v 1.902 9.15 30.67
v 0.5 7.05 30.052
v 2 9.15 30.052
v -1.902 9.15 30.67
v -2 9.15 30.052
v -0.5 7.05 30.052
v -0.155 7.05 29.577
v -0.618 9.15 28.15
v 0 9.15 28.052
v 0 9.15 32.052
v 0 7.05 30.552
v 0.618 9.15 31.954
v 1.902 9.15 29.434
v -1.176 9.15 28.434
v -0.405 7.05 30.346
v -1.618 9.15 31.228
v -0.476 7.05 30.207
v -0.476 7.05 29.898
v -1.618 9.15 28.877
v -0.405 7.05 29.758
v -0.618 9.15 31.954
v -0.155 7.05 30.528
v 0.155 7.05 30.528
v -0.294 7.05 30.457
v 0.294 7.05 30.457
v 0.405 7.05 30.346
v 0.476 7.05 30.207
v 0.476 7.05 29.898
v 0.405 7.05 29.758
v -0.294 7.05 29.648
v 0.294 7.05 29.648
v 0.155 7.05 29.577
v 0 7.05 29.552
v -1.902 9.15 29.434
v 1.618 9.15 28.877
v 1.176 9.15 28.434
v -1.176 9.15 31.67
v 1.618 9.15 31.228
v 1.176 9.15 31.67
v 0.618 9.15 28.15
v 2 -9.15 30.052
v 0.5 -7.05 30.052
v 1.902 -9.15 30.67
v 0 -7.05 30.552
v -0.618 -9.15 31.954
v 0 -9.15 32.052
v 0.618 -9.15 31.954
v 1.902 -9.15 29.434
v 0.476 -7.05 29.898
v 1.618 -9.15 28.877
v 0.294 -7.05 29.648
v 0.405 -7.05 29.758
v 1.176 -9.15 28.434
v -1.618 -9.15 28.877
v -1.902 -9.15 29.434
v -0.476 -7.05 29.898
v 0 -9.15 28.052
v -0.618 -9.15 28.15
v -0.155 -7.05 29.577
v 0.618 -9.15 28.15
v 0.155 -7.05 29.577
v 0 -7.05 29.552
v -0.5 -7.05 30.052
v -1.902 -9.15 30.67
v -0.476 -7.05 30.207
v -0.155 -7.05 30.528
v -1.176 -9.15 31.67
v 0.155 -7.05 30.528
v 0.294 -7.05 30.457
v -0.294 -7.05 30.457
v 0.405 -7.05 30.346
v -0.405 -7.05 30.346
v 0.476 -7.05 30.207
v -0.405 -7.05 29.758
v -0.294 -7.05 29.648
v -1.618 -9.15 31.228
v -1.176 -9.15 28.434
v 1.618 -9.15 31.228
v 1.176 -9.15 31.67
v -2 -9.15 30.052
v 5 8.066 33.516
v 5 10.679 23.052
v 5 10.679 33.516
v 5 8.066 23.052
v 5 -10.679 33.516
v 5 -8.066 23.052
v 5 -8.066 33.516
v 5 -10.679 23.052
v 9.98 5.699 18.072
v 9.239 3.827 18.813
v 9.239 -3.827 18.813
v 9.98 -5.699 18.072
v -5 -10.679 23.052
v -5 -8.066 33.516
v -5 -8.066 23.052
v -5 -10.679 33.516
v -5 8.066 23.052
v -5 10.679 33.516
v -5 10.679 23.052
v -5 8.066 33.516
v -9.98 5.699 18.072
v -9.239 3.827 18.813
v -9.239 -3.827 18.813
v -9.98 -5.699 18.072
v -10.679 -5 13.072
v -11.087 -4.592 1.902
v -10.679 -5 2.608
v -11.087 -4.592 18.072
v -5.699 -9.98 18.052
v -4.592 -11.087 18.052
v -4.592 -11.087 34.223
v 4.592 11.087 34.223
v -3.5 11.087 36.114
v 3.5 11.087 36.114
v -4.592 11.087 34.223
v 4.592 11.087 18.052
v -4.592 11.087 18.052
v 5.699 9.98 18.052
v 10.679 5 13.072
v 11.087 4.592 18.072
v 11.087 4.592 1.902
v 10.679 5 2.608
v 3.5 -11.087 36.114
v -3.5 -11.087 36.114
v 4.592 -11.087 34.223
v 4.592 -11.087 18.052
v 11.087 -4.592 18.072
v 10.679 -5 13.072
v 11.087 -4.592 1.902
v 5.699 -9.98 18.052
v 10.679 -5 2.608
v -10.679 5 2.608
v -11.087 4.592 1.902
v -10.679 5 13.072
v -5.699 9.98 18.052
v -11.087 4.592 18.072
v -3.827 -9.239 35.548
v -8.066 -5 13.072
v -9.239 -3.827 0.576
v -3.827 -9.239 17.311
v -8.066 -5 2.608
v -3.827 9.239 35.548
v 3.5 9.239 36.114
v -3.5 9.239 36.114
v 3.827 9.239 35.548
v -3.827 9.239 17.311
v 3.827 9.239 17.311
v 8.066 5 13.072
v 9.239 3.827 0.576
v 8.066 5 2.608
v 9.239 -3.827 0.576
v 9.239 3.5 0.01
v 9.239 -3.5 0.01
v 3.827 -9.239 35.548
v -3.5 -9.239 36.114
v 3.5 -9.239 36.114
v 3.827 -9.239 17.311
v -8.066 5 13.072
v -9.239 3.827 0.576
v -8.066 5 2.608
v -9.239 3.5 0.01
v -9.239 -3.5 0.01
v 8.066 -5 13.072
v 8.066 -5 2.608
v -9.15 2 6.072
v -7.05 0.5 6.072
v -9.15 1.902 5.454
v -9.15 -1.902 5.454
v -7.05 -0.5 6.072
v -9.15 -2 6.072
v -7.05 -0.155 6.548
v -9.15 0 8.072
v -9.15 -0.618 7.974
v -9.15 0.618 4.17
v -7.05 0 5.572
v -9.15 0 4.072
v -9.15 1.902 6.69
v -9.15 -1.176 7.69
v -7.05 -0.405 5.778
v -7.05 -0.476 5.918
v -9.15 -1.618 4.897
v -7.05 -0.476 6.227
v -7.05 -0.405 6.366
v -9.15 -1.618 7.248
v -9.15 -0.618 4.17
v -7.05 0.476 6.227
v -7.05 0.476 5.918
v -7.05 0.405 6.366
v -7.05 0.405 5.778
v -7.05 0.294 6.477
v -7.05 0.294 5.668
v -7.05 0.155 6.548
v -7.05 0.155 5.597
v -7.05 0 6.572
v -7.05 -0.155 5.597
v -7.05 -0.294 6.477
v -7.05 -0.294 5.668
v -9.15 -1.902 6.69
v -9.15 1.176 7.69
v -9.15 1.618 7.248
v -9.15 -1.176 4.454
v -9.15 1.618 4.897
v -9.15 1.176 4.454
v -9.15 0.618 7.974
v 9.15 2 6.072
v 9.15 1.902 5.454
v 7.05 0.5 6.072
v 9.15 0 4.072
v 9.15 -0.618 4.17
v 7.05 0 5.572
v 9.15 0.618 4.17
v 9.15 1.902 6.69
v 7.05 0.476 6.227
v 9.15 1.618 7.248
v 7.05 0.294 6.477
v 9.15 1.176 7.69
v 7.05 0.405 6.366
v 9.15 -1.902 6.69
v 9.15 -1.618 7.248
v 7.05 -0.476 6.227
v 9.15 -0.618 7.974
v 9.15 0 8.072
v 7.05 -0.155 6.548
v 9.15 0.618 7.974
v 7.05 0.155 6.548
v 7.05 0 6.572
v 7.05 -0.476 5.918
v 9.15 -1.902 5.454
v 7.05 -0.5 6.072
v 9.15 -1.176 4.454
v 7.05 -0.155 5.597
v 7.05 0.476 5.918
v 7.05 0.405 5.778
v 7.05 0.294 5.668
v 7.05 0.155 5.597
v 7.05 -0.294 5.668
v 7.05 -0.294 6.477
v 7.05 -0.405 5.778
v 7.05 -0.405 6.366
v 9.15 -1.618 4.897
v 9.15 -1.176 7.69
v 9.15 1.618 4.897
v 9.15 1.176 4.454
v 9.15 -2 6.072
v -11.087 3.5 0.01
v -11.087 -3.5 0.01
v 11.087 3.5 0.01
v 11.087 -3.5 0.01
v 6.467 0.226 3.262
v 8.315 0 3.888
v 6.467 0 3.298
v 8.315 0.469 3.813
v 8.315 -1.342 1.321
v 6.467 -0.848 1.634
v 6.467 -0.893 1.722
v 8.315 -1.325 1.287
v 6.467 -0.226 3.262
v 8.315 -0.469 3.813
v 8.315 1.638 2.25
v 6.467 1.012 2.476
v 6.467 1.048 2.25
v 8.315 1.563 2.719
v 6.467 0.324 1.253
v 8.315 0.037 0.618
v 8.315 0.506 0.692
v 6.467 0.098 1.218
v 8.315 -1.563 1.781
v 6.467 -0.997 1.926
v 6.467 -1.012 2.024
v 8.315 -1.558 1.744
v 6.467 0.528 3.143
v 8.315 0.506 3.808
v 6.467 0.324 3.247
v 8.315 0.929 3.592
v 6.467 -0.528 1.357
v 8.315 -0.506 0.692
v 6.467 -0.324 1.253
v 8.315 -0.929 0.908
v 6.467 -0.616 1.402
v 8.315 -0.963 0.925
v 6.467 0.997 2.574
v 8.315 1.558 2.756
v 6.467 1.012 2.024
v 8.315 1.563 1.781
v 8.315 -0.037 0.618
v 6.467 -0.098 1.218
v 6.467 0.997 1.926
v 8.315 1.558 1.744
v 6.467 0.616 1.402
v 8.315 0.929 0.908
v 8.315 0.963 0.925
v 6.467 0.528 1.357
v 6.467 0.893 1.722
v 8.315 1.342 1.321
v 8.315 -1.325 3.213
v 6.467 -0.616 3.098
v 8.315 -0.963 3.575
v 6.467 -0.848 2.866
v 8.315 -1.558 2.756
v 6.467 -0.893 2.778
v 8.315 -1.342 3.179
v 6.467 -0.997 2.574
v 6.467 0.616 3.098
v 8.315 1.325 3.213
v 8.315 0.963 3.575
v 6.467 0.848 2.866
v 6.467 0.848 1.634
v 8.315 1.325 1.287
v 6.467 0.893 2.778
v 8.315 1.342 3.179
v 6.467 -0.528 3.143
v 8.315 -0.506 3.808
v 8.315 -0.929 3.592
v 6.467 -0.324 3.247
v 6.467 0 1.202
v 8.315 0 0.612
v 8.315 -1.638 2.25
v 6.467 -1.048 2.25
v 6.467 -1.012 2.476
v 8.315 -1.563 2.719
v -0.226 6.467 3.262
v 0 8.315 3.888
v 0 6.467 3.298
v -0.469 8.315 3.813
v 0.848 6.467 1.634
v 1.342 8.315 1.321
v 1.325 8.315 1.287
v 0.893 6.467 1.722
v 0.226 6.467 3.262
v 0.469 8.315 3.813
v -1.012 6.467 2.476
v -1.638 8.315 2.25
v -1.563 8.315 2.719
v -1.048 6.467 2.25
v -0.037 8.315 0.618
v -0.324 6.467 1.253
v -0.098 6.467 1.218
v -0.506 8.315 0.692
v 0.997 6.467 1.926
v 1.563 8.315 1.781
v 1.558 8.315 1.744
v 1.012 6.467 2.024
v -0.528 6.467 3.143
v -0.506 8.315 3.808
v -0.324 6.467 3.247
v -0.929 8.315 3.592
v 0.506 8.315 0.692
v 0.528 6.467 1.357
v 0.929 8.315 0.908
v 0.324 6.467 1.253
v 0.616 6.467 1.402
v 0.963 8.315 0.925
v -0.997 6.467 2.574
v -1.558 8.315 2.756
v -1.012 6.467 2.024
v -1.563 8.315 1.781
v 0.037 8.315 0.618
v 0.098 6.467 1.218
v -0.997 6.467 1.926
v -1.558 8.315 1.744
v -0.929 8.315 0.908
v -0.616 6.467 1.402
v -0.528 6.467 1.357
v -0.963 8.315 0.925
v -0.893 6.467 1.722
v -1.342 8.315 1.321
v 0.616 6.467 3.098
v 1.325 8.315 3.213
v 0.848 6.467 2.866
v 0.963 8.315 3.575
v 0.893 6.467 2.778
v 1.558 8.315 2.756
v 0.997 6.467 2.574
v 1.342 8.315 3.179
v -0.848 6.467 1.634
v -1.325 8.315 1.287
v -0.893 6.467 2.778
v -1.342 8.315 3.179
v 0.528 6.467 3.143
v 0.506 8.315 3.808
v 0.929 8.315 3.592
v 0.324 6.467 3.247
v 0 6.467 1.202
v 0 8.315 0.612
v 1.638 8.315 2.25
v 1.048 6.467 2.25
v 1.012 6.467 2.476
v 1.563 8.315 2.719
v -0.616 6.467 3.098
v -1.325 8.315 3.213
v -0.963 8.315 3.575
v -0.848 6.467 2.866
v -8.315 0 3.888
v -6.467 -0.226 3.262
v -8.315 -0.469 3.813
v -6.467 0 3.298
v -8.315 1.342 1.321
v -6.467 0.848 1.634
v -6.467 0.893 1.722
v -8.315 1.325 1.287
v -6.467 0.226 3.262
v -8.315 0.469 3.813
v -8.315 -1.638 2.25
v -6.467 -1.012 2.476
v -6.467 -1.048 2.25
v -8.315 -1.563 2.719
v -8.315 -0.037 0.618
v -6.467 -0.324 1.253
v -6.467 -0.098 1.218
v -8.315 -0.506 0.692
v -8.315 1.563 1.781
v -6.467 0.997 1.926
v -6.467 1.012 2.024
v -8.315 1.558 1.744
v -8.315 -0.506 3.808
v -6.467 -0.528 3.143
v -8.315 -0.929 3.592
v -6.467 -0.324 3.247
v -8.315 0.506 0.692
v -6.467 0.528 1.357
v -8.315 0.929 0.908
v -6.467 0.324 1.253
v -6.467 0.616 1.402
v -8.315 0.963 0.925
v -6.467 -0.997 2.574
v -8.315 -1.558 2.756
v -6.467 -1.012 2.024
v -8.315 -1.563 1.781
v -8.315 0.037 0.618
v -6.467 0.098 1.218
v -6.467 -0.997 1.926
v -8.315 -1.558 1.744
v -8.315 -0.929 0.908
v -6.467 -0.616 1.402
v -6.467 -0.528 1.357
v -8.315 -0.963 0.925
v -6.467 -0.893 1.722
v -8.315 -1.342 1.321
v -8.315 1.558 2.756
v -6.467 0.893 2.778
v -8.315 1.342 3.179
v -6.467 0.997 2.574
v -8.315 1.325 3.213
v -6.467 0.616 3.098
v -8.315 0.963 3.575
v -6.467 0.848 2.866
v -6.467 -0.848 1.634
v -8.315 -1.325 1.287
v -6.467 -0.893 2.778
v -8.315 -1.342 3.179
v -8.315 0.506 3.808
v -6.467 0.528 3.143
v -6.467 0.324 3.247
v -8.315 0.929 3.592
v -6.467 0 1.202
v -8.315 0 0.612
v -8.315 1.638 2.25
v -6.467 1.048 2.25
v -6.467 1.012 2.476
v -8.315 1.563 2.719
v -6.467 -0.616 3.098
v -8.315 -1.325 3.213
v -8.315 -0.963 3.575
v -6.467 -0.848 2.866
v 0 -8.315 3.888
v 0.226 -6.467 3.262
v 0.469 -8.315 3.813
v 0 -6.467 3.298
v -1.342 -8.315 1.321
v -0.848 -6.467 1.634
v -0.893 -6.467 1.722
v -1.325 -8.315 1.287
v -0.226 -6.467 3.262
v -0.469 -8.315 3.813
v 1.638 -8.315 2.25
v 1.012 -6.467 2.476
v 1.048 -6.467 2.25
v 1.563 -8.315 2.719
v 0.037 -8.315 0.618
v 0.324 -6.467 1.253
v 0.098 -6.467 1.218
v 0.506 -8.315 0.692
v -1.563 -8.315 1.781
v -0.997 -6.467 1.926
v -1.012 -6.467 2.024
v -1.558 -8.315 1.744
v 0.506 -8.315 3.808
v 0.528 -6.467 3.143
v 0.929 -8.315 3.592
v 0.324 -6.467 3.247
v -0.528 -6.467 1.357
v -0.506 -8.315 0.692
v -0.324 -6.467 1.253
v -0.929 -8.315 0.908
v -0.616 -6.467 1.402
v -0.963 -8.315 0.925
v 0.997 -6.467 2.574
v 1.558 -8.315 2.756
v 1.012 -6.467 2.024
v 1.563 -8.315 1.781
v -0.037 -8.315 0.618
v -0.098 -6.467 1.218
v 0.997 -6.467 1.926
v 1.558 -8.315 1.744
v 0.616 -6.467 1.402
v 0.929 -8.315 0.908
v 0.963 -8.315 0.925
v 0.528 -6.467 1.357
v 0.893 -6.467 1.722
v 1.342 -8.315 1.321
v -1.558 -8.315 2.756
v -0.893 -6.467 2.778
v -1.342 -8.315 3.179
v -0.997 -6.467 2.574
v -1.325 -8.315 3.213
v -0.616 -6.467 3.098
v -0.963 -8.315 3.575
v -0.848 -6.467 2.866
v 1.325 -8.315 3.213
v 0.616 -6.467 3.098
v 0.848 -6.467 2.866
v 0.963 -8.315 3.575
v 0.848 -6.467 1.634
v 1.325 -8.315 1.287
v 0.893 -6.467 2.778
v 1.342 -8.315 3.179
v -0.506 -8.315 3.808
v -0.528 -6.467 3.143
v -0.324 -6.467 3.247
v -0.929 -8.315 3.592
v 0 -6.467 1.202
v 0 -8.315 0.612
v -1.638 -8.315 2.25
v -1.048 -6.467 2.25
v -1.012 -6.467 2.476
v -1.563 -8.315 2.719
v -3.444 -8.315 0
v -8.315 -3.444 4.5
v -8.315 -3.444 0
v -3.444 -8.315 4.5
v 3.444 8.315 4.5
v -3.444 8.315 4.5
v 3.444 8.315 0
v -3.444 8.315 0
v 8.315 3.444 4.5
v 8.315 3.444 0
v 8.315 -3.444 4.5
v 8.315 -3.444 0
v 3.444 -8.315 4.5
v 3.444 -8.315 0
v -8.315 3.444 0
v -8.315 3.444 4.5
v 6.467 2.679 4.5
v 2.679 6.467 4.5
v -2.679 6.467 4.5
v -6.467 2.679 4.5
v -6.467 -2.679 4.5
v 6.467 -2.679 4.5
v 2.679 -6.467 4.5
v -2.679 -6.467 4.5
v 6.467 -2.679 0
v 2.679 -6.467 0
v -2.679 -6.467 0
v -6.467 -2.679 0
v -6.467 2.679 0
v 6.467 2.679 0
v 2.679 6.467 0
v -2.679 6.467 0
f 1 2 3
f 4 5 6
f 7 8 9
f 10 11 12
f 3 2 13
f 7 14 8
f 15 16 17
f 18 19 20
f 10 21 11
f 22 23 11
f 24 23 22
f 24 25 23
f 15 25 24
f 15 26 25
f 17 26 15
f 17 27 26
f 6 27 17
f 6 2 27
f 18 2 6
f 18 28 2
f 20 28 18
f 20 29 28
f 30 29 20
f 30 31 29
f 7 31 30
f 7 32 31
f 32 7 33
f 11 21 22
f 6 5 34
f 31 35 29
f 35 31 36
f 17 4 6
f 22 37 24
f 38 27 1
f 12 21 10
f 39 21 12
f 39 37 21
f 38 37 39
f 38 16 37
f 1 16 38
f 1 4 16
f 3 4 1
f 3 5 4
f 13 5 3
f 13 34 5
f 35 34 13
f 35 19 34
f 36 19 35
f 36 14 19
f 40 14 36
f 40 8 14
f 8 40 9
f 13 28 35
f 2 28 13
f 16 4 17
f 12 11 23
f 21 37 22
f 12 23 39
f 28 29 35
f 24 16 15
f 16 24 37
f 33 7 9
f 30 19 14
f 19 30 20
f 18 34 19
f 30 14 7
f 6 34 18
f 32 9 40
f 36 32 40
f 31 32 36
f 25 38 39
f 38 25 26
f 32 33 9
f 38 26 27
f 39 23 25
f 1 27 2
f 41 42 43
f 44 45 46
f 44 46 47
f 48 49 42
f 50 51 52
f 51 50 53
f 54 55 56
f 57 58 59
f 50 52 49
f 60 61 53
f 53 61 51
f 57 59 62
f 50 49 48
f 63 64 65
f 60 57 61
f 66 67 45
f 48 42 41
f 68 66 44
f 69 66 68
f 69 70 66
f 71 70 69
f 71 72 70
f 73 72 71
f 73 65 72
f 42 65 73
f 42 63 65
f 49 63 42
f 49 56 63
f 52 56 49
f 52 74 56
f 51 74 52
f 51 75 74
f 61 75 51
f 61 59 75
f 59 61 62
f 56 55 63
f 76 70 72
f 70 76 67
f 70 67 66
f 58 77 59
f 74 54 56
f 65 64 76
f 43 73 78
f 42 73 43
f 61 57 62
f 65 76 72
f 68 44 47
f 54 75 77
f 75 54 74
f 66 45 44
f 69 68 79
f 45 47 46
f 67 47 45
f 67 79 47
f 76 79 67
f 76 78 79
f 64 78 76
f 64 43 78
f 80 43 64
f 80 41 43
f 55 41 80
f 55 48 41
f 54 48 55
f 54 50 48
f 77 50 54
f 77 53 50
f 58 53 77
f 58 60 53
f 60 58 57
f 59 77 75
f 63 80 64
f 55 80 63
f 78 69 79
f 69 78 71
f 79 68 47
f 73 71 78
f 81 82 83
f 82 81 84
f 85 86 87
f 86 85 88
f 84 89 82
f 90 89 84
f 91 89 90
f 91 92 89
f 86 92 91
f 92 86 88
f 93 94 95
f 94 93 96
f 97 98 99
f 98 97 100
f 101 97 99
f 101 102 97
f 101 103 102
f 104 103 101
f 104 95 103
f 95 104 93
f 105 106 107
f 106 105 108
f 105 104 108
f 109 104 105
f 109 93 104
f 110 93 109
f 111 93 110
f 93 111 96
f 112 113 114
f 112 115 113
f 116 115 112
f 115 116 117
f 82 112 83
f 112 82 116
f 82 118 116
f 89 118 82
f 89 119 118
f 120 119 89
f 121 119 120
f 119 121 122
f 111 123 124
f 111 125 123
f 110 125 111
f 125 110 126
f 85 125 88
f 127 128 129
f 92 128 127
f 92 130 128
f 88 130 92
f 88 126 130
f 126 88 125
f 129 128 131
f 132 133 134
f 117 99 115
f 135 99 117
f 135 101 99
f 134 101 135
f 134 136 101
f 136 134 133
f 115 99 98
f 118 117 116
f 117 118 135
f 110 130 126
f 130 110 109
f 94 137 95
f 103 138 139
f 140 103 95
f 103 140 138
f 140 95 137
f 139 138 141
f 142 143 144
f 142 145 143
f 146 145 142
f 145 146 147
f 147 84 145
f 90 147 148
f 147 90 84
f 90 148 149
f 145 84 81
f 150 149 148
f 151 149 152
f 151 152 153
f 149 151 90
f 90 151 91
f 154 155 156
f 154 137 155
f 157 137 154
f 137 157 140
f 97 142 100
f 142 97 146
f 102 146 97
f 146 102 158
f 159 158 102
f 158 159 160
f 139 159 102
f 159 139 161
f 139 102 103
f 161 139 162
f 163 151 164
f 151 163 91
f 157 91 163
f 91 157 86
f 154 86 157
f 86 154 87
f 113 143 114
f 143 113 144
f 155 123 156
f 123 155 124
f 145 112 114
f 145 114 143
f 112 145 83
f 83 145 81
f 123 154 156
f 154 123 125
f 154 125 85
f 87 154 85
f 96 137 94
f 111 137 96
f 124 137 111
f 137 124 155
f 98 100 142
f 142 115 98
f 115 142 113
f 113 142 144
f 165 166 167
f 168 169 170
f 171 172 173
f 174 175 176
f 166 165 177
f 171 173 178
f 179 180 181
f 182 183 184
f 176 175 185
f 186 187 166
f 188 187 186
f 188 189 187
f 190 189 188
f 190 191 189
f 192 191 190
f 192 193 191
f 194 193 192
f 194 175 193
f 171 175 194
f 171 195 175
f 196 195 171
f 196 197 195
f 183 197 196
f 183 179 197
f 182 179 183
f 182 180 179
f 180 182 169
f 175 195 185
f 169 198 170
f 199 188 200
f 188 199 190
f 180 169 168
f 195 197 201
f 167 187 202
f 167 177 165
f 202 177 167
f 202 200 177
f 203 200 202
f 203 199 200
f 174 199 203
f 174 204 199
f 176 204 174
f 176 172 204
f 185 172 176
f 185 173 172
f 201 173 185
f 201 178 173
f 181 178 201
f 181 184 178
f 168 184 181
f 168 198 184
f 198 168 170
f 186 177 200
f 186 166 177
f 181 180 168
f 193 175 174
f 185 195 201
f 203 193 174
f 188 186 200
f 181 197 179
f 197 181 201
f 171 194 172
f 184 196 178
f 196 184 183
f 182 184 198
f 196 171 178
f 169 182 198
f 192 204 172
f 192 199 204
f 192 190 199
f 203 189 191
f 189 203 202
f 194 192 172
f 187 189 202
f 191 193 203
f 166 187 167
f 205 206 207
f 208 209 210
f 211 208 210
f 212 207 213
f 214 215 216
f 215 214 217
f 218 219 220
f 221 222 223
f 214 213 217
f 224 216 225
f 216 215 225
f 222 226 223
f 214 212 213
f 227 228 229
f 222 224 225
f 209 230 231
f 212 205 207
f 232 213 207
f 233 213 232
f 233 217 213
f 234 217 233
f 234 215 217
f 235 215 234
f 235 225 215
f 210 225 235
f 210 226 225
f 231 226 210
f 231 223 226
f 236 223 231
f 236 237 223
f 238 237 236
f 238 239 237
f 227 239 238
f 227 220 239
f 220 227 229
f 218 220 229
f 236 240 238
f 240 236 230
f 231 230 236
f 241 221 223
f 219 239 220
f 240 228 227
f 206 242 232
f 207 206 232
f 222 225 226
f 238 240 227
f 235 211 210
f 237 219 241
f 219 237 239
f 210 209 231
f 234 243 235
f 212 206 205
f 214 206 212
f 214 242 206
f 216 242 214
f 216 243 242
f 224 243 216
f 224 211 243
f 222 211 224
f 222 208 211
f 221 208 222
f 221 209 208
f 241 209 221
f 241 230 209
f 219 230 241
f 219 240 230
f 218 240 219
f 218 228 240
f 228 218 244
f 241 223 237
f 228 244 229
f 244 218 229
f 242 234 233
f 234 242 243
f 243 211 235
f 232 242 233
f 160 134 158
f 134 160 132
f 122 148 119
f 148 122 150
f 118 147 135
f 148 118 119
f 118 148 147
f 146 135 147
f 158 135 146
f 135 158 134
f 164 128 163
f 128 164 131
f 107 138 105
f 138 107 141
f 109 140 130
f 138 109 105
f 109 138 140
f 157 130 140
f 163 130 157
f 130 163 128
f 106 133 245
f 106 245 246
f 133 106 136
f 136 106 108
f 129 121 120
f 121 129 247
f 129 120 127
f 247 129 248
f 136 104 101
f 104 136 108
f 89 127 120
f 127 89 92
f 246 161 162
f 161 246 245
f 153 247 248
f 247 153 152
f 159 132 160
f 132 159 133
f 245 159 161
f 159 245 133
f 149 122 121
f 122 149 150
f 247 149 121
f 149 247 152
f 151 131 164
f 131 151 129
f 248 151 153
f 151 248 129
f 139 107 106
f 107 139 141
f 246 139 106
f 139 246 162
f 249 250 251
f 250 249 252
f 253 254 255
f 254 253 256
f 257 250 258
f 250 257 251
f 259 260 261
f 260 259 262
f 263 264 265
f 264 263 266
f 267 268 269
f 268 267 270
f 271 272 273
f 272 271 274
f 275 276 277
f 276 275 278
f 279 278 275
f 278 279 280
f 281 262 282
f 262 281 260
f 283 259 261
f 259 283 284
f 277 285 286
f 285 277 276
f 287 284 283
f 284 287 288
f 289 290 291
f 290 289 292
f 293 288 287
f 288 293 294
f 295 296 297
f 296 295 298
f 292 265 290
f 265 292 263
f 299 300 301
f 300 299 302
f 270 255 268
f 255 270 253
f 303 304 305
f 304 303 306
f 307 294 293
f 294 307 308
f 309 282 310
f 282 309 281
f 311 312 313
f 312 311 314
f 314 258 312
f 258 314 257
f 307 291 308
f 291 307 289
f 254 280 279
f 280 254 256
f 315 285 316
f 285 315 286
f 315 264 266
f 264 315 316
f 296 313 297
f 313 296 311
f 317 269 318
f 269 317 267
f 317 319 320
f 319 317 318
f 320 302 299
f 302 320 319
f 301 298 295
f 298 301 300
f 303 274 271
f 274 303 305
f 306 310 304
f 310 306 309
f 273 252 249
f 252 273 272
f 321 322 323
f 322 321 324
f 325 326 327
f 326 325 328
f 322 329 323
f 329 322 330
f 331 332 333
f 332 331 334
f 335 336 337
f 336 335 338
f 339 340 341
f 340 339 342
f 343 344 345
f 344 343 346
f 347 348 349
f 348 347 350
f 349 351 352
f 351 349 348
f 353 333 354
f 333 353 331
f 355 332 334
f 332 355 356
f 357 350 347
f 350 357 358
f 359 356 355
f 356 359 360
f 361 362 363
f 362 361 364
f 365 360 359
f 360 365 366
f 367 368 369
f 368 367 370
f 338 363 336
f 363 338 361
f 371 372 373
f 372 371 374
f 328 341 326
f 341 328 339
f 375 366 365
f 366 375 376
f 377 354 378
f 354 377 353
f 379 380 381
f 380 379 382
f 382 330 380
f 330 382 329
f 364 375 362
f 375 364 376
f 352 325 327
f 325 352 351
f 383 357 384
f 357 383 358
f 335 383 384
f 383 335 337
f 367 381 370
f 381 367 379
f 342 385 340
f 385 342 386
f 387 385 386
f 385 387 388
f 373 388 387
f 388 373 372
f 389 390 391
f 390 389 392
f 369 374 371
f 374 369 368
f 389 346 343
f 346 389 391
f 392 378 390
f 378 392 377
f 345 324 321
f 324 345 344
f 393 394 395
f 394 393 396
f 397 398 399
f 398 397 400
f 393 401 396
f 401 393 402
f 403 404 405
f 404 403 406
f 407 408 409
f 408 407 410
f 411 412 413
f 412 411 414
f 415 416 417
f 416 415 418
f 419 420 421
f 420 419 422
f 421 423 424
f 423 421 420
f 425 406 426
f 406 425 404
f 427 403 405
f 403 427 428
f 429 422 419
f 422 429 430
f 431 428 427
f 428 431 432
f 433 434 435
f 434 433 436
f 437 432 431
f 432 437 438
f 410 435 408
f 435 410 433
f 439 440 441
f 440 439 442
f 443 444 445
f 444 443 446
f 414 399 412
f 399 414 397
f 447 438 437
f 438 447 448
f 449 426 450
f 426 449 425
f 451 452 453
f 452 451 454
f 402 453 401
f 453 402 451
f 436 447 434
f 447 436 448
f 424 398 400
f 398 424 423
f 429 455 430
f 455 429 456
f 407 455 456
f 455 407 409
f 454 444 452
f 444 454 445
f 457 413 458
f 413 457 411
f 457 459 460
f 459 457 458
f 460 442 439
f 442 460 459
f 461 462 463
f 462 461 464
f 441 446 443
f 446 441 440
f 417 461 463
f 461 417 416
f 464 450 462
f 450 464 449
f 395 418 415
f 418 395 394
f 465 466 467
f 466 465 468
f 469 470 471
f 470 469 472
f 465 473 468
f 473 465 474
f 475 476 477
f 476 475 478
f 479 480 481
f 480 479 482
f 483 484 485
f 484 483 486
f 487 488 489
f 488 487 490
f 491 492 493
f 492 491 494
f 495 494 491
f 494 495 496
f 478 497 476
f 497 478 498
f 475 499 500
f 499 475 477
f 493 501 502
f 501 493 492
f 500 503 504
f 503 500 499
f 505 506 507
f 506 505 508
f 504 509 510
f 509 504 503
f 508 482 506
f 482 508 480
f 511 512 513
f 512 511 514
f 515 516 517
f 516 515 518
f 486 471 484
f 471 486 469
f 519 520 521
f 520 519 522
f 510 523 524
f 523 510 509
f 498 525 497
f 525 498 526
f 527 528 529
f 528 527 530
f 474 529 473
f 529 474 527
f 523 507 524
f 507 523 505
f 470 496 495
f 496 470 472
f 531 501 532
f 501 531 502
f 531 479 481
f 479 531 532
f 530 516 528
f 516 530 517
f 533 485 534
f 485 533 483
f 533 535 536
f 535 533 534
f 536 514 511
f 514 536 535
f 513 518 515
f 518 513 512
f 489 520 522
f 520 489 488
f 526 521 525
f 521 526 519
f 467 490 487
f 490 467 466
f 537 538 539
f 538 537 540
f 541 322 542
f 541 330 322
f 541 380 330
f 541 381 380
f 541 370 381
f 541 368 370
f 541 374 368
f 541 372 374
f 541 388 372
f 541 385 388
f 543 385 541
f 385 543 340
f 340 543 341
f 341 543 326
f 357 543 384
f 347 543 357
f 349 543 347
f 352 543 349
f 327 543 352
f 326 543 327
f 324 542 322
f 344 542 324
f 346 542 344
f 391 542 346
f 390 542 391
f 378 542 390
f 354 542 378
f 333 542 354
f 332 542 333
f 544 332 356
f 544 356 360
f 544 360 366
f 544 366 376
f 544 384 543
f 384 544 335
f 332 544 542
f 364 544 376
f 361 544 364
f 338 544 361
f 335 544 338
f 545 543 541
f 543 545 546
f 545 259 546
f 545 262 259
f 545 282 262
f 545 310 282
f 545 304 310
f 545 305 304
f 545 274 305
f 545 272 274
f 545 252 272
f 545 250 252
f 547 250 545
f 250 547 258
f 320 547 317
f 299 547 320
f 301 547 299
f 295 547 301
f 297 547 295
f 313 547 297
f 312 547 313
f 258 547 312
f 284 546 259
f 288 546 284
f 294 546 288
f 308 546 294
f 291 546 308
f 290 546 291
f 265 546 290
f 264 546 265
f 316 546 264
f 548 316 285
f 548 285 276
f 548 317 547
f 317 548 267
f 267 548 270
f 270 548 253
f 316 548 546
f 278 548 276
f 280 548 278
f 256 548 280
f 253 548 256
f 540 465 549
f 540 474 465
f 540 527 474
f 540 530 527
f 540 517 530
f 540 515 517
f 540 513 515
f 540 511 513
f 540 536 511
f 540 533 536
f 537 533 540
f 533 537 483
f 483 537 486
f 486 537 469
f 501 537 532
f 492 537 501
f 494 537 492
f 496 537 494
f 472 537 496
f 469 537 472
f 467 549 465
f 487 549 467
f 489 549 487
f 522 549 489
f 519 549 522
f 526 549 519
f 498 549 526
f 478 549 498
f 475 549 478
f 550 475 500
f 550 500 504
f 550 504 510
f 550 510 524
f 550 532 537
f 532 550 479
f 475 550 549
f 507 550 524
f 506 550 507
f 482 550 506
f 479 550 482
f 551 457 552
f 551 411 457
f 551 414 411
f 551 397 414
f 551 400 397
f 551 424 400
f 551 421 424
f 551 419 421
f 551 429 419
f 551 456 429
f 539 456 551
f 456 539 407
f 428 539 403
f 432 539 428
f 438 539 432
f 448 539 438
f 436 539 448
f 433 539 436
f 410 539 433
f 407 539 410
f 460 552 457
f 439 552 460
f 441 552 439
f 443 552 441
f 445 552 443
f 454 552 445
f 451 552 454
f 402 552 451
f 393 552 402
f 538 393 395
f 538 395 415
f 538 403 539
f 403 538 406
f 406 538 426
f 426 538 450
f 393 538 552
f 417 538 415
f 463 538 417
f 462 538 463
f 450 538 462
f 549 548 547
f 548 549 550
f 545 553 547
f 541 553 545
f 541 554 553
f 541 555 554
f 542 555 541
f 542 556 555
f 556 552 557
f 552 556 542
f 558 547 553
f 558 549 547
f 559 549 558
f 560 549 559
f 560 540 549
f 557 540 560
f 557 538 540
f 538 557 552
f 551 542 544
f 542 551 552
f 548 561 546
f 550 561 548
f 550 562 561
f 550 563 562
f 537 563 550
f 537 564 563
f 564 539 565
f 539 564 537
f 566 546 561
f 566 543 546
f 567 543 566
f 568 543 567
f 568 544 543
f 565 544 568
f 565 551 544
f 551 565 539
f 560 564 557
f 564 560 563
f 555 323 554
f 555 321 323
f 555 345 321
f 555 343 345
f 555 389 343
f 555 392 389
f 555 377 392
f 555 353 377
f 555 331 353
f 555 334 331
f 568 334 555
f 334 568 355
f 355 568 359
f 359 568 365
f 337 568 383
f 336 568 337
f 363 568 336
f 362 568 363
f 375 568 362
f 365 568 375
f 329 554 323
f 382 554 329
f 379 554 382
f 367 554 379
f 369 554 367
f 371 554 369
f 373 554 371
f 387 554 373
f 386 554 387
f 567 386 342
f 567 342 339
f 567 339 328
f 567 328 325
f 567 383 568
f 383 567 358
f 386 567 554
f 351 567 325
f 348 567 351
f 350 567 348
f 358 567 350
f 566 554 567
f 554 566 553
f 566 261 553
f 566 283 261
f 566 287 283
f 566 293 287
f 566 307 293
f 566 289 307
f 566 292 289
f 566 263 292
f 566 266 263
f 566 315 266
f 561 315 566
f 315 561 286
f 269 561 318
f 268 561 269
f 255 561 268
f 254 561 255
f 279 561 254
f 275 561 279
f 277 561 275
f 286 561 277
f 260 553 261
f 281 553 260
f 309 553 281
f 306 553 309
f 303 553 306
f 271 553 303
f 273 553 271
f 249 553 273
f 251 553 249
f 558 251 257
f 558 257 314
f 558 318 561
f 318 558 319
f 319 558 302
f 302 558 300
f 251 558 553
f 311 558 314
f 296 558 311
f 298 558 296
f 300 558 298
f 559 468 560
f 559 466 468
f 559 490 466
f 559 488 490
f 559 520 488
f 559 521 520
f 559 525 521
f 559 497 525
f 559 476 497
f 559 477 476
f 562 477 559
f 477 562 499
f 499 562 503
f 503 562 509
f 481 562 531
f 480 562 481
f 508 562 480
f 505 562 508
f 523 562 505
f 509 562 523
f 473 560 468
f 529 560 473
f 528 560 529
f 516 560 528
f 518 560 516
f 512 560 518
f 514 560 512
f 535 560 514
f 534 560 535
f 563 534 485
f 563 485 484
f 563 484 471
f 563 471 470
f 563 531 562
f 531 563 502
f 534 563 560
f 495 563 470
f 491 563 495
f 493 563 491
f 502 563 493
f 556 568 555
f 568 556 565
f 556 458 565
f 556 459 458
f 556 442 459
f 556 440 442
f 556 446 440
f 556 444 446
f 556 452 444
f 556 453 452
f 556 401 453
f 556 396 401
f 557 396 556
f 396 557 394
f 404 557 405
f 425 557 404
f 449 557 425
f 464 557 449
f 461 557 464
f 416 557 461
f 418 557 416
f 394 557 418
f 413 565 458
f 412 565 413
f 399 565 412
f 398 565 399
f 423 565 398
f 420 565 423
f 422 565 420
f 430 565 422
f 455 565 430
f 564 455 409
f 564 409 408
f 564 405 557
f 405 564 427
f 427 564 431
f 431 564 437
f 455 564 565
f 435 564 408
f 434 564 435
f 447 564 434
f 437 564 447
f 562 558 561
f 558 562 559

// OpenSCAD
//show the build plate
translate([0,0,-.1])
%cube([200,200,.2], center=true);


outer_rad = 12;				//radius of outer tube
wall = 2; 					//thickness of tube
base = outer_rad/4-5;			//base height, one half
height = outer_rad*2-5;		//overall height, one half
arm_thickness = outer_rad-wall;	//arm thickness
ring_rad = outer_rad-wall-1;		//radius of connector ring
ring_thick = 4.5;				//thickness of connector ring

spike_rad = 2;				//max radius of spike


////////////you probably don't want to change these :-)
base_rad = outer_rad-arm_thickness/2;	//radius on base to arms
upper_rad = arm_thickness/2+2;		//top radius

//these are tricks to make the 'cylinder' angles printable standing up.
//If you print bracket_half instead you can make 'em nice and round.
roundness = 8;		
side_roundness = 4;
top_roundness = 6;

//have to fix the height because of the flatness constraint
//on the top round segment.
delta_h = upper_rad - (upper_rad/2*sqrt(3));

module spike(r, h) {
	cylinder(h=h,r1=r, r2=r/4, center = true, $fn=20);
}

module bracket(){

	translate([0,0,height - delta_h])

	for(j=[0:1]){
		mirror([0,0,j])
		translate([0,0,-.01])
		rotate([0,0,90*j])
		bracket_half();
	}
}

module bracket_half() {
	union(){
		for(k=[0:1]){
			mirror([0,k,0])
			translate([0,outer_rad-wall*2+.1,height-upper_rad])
			rotate([90,0,0])
			spike(r=spike_rad, h=wall+.1);
		}

	difference() {
		difference() {	
			rotate([0,0,180/roundness])
			cylinder(r=outer_rad, h=height, $fn=roundness);
	
			//hollow out the center
			translate([0,0,-.1])
			rotate([0,0,180/roundness])
			cylinder(r=outer_rad-wall, h=height+.2, $fn=roundness);
	
			for(i=[0:1]){
				mirror([i,0,0]){
					//shave off one side
					translate([arm_thickness+outer_rad/2,0,height+base+base_rad])
					cube([arm_thickness+outer_rad,outer_rad*2+1,height*2], center=true);
			
					//round the base corner
					translate([outer_rad,0,base+base_rad])
					rotate([90,0,0])
					cylinder(r=base_rad, h=outer_rad*2+1, center=true, $fn=side_roundness);

			
				}
			}
		}

		//round out the top
		translate([0,0,height-upper_rad])
		difference() {
			cube([outer_rad*2+1,outer_rad*2+1,upper_rad*2+1], center=true);

			rotate([90,0,0])
			cylinder(r=upper_rad, h=outer_rad*2+2, center=true, $fn=top_roundness);	
			
			translate([0,0,-outer_rad/2])
			cube([outer_rad*2+2,outer_rad*2+2,outer_rad], center=true);
		}
	}
}
}

module ring(){
	difference() {
		rotate([0,0,180/roundness])
		cylinder(r=ring_rad, h=ring_thick, $fn=roundness);
		translate([0,0,-.1])
		rotate([0,0,180/roundness])
		cylinder(r=ring_rad-wall, h=ring_thick+.2, $fn=roundness);

		for(i=[0:4]){
			rotate([0,0,90*i])
			translate([ring_rad-wall+.1,0,ring_thick/2])
			rotate([0,-90,0])
			spike(r=spike_rad, h=ring_thick+.2);
		}
	}
}

module joint() {
	bracket();

	translate([0,0,height*2-upper_rad-ring_thick/2-delta_h])
	ring();

	translate([0,0,height*2-upper_rad*2])
	bracket();
}

module plate(x,y){
	translate([-outer_rad*(x+1), -outer_rad*(y+1),0])
	for(i=[1:x]){
		for(j=[1:y]){
			translate([outer_rad*2*i,outer_rad*2*j,0]){
				bracket();
				ring();
			}
		}
	}
}

//joint();

//bracket();
//ring();

plate(1,1);
